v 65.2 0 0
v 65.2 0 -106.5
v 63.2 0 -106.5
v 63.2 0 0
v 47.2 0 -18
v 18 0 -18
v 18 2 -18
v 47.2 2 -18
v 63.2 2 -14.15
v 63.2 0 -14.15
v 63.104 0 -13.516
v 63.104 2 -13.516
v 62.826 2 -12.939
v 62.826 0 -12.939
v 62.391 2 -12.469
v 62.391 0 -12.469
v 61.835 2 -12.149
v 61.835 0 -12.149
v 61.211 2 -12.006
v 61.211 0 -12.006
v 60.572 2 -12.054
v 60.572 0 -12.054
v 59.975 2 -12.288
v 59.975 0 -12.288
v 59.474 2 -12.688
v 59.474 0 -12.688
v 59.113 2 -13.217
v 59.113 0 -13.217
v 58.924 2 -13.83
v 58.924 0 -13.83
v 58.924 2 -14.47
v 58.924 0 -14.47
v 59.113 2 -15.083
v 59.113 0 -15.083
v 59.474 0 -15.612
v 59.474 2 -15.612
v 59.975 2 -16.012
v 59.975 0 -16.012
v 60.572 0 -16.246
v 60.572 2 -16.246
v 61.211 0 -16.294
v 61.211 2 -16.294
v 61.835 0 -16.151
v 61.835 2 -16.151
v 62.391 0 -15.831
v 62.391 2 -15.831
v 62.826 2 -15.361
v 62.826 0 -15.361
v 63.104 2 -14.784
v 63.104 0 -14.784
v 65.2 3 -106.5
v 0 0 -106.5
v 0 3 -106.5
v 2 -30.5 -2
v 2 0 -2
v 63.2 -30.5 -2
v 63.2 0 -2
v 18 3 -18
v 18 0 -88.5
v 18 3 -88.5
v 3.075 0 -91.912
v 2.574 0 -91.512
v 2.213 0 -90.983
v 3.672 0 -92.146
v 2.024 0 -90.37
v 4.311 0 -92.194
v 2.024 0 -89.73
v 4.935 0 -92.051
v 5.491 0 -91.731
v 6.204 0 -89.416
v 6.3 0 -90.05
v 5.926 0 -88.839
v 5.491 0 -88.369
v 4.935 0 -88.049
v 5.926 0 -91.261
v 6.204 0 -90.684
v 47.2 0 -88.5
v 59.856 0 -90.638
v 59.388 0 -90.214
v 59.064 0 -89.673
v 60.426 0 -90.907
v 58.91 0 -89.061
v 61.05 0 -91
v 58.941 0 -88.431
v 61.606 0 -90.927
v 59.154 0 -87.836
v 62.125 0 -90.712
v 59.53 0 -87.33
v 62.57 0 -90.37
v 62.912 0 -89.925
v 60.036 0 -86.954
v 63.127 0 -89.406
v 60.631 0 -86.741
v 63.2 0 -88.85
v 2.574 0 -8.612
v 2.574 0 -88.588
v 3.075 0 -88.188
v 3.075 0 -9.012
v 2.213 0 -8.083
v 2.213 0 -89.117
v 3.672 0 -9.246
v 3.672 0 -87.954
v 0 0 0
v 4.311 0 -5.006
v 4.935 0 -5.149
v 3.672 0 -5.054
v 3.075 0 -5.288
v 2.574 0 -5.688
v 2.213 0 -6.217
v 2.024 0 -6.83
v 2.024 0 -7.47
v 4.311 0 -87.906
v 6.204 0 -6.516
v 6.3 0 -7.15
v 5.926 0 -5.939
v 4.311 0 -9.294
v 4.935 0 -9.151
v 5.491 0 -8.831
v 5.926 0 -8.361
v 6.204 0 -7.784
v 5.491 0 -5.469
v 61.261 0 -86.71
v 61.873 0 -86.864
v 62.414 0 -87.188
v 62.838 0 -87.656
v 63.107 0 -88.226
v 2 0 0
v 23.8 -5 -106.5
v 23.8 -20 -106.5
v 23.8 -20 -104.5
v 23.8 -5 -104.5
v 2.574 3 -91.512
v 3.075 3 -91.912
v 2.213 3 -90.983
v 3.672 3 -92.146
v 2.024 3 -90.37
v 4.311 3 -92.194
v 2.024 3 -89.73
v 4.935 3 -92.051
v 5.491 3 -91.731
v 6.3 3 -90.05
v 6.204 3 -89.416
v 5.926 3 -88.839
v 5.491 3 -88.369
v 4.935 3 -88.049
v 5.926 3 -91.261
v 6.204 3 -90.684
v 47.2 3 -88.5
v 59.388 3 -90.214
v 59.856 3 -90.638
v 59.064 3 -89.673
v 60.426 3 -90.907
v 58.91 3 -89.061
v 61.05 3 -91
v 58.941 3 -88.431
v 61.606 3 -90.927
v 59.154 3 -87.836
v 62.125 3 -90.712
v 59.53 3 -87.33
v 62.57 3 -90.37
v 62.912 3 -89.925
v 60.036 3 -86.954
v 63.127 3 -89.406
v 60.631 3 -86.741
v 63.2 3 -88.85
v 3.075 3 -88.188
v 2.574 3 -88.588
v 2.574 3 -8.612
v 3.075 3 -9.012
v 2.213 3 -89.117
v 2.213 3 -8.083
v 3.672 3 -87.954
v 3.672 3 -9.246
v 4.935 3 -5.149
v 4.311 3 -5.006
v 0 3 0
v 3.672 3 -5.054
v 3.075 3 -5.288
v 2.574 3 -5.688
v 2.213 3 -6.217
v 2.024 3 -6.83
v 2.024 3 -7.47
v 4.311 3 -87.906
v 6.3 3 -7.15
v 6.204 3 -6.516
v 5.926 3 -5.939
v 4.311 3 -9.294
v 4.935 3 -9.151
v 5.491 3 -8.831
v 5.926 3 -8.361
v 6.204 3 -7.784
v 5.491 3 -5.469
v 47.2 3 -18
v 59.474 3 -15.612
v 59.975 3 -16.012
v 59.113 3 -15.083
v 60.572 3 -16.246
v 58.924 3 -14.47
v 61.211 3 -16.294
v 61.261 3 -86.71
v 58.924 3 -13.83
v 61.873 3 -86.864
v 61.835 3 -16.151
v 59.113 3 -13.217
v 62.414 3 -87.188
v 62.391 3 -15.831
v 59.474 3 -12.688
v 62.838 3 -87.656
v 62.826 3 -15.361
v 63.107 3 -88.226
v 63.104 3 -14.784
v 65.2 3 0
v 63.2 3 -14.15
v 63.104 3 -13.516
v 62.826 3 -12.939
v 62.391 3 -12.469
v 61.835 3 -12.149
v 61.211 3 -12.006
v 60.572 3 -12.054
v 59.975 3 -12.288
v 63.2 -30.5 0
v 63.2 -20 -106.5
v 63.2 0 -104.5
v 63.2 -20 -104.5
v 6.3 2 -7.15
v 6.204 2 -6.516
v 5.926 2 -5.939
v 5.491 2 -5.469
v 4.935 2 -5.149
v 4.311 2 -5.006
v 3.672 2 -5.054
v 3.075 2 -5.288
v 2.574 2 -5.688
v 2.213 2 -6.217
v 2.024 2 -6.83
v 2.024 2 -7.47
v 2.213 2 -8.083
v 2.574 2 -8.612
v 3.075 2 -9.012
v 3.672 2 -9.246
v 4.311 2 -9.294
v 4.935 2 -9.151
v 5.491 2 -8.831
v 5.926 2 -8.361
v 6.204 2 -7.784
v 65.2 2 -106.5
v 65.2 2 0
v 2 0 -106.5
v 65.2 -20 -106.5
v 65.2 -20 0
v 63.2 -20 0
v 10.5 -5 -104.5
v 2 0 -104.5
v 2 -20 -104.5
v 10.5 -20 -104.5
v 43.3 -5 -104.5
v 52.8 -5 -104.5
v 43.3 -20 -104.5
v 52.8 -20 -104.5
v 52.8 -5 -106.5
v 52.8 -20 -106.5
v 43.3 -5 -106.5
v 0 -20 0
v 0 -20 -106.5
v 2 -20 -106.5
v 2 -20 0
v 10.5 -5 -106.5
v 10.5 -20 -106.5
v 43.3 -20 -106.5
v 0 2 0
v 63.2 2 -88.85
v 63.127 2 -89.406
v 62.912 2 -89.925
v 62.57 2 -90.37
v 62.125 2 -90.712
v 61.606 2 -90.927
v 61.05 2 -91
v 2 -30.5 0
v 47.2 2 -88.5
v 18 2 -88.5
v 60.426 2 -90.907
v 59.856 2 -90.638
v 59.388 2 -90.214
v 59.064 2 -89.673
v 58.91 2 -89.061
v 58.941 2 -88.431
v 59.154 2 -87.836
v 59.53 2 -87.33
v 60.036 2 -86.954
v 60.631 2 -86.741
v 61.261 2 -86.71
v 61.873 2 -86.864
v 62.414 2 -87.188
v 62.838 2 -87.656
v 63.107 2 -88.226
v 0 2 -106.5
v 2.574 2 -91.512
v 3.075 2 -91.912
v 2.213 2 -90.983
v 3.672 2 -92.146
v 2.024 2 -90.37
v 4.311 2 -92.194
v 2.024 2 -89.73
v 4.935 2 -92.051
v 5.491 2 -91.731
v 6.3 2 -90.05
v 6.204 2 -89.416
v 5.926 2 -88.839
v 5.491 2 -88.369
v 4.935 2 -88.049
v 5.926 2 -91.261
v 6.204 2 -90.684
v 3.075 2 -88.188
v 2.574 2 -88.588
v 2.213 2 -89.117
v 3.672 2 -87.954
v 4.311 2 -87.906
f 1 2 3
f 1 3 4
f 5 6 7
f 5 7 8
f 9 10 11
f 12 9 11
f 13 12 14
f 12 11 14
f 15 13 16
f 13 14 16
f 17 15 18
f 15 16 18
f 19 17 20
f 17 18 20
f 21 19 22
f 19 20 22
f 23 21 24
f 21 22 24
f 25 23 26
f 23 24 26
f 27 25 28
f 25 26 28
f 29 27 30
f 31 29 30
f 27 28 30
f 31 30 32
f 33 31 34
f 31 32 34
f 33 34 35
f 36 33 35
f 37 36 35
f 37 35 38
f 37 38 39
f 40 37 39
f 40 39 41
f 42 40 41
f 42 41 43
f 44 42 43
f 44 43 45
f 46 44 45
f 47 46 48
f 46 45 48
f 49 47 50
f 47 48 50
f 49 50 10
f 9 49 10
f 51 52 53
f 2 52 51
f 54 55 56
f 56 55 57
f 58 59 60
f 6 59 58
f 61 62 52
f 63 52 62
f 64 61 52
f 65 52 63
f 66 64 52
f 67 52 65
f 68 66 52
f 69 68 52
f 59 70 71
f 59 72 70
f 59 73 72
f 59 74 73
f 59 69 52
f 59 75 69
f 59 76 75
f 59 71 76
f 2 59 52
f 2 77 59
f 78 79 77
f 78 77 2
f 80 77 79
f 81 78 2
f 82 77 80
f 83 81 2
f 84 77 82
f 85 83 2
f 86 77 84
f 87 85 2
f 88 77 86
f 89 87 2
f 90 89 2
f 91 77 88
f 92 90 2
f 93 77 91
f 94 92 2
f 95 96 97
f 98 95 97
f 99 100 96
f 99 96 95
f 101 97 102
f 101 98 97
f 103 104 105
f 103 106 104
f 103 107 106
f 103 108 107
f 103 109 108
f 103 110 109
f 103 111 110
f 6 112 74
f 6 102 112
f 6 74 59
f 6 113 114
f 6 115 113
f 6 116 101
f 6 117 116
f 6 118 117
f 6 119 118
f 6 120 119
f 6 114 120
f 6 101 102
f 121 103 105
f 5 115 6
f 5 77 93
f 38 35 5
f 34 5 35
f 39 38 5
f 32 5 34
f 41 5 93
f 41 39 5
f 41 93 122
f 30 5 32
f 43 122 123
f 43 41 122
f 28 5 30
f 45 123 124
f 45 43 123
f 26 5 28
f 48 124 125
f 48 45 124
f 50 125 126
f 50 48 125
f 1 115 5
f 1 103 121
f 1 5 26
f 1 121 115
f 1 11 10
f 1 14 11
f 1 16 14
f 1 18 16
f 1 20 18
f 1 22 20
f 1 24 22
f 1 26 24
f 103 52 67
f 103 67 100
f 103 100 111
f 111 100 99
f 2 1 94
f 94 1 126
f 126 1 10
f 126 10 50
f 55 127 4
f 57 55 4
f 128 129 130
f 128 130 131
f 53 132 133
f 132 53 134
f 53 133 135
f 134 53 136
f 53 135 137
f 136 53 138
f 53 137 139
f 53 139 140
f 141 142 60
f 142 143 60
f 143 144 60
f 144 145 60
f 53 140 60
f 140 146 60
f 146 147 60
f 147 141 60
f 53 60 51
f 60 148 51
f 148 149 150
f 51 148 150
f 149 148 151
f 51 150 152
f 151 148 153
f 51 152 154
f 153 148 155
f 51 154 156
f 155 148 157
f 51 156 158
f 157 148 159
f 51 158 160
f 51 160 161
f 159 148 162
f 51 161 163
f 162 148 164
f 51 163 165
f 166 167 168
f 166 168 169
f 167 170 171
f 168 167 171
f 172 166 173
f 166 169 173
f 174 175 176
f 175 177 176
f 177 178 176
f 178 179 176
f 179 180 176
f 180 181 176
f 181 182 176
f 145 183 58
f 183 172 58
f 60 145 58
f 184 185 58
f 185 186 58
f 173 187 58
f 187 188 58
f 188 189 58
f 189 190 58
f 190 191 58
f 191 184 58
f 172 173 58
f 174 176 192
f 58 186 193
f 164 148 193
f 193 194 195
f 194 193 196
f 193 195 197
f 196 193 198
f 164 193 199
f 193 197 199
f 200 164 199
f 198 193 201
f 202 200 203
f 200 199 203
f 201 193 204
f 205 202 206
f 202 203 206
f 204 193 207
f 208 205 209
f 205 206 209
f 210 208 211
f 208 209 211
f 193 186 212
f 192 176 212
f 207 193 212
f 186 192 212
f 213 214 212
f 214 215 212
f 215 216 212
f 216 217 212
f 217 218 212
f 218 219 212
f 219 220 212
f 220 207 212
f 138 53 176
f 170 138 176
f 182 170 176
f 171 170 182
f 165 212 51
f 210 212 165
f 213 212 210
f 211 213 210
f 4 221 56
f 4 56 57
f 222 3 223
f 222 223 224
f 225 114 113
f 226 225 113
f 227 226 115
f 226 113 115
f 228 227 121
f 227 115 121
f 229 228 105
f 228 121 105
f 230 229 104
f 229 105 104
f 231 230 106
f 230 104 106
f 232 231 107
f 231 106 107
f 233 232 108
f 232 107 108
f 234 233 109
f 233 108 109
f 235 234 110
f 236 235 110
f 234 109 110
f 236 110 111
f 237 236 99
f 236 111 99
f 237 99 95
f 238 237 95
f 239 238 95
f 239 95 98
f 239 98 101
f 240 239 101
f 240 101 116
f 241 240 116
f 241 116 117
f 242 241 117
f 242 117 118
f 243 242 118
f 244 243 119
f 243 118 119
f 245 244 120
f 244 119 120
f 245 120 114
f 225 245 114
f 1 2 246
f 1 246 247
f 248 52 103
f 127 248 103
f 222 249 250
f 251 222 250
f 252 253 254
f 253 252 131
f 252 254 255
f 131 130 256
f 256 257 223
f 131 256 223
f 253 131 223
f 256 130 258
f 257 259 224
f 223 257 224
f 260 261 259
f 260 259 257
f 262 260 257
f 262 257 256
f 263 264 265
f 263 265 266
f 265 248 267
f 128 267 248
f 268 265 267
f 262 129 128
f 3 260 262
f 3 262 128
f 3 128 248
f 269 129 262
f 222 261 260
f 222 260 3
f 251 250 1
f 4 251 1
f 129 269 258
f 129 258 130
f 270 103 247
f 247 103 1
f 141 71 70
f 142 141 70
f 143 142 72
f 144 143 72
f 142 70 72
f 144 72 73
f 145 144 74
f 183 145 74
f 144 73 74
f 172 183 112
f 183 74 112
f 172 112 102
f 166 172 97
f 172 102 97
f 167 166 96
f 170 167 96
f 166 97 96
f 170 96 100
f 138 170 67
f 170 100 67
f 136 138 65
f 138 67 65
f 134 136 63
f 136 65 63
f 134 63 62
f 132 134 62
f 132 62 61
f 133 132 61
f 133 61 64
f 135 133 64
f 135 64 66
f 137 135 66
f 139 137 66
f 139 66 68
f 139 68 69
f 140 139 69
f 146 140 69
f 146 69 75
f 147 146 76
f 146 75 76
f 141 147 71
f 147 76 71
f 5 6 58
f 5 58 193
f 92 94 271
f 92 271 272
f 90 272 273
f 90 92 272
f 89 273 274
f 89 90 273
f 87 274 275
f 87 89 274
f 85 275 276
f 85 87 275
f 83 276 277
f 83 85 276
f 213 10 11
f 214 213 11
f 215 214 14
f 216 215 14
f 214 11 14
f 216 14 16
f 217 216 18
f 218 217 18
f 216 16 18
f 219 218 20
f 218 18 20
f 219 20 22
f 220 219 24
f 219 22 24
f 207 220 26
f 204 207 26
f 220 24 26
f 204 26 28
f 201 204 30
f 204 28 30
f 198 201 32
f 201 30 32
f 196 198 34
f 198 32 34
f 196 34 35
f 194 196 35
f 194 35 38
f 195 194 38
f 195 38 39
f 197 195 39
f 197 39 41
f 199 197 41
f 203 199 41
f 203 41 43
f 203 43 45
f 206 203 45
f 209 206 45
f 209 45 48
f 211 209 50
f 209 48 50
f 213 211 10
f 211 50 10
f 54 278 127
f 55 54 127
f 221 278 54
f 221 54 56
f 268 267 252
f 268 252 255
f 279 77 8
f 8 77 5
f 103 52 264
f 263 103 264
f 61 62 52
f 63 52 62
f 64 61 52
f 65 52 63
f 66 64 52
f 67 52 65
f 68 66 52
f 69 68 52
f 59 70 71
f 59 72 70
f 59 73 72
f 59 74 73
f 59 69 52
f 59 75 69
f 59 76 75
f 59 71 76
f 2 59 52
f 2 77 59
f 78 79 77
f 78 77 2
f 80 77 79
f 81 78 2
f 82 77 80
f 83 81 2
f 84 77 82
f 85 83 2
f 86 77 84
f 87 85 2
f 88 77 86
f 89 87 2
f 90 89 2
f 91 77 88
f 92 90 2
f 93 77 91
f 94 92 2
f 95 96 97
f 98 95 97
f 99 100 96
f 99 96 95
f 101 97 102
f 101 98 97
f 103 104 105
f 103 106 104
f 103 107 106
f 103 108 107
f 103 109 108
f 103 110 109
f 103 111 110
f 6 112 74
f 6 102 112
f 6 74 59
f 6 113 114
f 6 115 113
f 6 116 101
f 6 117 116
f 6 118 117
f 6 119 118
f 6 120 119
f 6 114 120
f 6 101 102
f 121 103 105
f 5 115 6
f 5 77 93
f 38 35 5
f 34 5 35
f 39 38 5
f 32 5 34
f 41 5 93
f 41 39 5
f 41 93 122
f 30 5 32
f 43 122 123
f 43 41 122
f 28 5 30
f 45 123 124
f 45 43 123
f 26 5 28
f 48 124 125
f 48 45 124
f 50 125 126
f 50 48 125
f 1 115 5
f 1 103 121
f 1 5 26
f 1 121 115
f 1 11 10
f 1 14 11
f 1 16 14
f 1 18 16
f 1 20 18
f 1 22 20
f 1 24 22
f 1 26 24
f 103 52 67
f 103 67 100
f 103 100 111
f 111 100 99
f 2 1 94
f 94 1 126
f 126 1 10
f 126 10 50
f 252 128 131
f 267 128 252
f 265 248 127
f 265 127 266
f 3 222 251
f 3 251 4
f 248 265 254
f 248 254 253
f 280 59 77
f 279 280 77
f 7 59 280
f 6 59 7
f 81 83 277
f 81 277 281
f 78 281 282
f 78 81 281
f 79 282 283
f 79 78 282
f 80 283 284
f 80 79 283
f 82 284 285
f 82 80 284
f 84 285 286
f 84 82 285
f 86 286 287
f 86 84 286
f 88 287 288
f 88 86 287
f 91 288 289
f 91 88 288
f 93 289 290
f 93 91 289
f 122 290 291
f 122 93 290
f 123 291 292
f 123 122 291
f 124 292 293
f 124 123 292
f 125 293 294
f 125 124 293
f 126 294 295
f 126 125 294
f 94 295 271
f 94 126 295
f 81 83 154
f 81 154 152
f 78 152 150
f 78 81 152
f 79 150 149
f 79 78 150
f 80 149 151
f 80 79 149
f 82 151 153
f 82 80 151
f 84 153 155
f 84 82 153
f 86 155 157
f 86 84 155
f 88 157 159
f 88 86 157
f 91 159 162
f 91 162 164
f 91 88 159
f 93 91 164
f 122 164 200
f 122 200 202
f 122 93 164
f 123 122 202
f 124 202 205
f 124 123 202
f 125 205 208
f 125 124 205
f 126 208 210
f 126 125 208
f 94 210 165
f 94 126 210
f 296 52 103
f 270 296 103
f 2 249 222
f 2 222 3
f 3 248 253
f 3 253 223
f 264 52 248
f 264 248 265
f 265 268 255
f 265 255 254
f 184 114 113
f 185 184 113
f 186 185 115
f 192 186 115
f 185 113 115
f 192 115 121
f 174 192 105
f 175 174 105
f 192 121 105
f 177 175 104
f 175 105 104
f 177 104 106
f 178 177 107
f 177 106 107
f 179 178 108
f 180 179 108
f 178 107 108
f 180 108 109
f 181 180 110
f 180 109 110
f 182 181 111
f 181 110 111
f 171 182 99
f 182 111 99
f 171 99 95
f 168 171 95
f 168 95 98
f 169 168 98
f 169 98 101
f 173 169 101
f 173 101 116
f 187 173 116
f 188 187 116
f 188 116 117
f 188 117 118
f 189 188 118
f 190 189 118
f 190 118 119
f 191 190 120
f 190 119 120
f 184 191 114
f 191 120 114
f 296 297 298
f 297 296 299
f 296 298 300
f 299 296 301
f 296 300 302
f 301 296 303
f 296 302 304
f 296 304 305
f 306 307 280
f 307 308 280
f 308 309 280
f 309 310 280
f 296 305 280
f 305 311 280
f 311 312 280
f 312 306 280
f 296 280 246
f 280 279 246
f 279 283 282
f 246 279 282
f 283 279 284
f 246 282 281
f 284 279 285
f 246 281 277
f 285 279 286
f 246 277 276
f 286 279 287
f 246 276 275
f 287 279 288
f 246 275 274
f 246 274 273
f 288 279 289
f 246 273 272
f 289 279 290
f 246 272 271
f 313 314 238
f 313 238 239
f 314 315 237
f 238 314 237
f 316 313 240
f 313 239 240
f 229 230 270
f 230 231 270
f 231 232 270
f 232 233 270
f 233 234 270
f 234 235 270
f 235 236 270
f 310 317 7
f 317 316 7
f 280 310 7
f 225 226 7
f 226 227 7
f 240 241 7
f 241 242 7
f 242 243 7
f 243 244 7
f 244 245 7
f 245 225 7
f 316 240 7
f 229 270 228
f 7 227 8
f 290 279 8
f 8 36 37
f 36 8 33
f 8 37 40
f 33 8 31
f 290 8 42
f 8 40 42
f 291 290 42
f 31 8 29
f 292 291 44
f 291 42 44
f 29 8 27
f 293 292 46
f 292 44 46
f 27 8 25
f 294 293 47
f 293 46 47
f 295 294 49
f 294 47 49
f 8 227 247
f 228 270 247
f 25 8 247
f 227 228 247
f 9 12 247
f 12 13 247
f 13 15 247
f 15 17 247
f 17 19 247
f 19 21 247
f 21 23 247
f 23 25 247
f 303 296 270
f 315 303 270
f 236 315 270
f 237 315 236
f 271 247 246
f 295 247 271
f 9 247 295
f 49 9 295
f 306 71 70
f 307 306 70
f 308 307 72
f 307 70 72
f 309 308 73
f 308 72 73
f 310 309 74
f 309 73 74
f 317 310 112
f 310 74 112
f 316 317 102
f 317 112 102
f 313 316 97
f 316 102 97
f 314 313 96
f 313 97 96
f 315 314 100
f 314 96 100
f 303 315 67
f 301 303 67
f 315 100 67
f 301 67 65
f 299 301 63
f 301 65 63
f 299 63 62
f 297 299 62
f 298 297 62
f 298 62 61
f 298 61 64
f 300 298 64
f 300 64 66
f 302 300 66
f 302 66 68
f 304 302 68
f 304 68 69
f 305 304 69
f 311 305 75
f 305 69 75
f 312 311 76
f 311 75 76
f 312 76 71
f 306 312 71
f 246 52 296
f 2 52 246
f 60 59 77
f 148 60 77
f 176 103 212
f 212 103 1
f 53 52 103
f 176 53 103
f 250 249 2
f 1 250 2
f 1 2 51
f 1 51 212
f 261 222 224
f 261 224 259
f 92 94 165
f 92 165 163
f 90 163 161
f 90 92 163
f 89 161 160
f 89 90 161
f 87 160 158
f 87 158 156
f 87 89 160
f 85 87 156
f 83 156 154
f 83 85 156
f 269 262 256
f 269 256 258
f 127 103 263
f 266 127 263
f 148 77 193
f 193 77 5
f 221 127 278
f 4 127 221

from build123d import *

# Parameters (mm, degrees)
F0_W      = 65.2
F0_H      = 106.5
F0_R      = 2.15
F0_W_2    = 29.2
F0_H_2    = 70.5
F1_DEPTH  = 3
F2_W      = 20
F2_H      = 106.5
F3_DEPTH  = 2
F4_W      = 20
F4_H      = 106.5
F5_DEPTH  = 2
F6_W      = 61.2
F6_H      = 30.5
F7_DEPTH  = 2
F9_DEPTH  = 2
F10_DEPTH = 2


with BuildPart() as f1:
    # F0 (on Front) → F1 (new body)
    with BuildSketch(Plane.XZ):
        with Locations((32.6, -53.25)):
            Rectangle(F0_W, F0_H)
        with Locations((4.15, -90.05)):
            Circle(F0_R, mode=Mode.SUBTRACT)
        with BuildLine():
            ThreePointArc((61.05, -91), (59.5297204204, -87.3297204204), (63.2, -88.85))
            ThreePointArc((63.2, -88.85), (62.5702795796, -90.3702795796), (61.05, -91))
        make_face(mode=Mode.SUBTRACT)
        with Locations((4.15, -7.15)):
            Circle(F0_R, mode=Mode.SUBTRACT)
        with Locations((32.6, -53.25)):
            Rectangle(F0_W_2, F0_H_2, mode=Mode.SUBTRACT)
        with Locations((61.05, -14.15)):
            Circle(F0_R, mode=Mode.SUBTRACT)
    extrude(amount=-F1_DEPTH)


with BuildPart() as f3:
    # F2 (on face) → F3 (new body)
    with BuildSketch(Plane.YZ.offset(65.2)):
        with Locations((-10, -53.25)):
            Rectangle(F2_W, F2_H)
    extrude(amount=-F3_DEPTH)


with BuildPart() as f5:
    # F4 (on face) → F5 (new body)
    with BuildSketch(Plane(origin=(0, 0, 0), x_dir=(0, -1, 0), z_dir=(-1, 0, 0))):
        with Locations((10, -53.25)):
            Rectangle(F4_W, F4_H)
    extrude(amount=-F5_DEPTH)


with BuildPart() as f7:
    # F6 (on face) → F7 (new body)
    with BuildSketch(Plane.XY):
        with Locations((32.6, -15.25)):
            Rectangle(F6_W, F6_H)
    extrude(amount=-F7_DEPTH)


with BuildPart() as f9:
    # F8 (on face) → F9 (new body)
    with BuildSketch(Plane(origin=(0, 0, -106.5), x_dir=(1, 0, 0), z_dir=(0, 0, -1))):
        Polygon((2, 20), (2, 0), (63.2, 0), (63.2, 20), (52.8, 20), (52.8, 5), (43.3, 5), (43.3, 20), (23.8, 20), (23.8, 5), (10.5, 5), (10.5, 20), align=None)
    extrude(amount=-F9_DEPTH)


with BuildPart() as f10:
    # F0 (on Front) → F10 (new body)
    with BuildSketch(Plane.XZ):
        with Locations((32.6, -53.25)):
            Rectangle(F0_W, F0_H)
        with Locations((4.15, -90.05)):
            Circle(F0_R, mode=Mode.SUBTRACT)
        with BuildLine():
            ThreePointArc((61.05, -91), (59.5297204204, -87.3297204204), (63.2, -88.85))
            ThreePointArc((63.2, -88.85), (62.5702795796, -90.3702795796), (61.05, -91))
        make_face(mode=Mode.SUBTRACT)
        with Locations((4.15, -7.15)):
            Circle(F0_R, mode=Mode.SUBTRACT)
        with Locations((32.6, -53.25)):
            Rectangle(F0_W_2, F0_H_2, mode=Mode.SUBTRACT)
        with Locations((61.05, -14.15)):
            Circle(F0_R, mode=Mode.SUBTRACT)
    extrude(amount=-F10_DEPTH)


solid = Compound([f1.part, f3.part, f5.part, f7.part, f9.part, f10.part])
